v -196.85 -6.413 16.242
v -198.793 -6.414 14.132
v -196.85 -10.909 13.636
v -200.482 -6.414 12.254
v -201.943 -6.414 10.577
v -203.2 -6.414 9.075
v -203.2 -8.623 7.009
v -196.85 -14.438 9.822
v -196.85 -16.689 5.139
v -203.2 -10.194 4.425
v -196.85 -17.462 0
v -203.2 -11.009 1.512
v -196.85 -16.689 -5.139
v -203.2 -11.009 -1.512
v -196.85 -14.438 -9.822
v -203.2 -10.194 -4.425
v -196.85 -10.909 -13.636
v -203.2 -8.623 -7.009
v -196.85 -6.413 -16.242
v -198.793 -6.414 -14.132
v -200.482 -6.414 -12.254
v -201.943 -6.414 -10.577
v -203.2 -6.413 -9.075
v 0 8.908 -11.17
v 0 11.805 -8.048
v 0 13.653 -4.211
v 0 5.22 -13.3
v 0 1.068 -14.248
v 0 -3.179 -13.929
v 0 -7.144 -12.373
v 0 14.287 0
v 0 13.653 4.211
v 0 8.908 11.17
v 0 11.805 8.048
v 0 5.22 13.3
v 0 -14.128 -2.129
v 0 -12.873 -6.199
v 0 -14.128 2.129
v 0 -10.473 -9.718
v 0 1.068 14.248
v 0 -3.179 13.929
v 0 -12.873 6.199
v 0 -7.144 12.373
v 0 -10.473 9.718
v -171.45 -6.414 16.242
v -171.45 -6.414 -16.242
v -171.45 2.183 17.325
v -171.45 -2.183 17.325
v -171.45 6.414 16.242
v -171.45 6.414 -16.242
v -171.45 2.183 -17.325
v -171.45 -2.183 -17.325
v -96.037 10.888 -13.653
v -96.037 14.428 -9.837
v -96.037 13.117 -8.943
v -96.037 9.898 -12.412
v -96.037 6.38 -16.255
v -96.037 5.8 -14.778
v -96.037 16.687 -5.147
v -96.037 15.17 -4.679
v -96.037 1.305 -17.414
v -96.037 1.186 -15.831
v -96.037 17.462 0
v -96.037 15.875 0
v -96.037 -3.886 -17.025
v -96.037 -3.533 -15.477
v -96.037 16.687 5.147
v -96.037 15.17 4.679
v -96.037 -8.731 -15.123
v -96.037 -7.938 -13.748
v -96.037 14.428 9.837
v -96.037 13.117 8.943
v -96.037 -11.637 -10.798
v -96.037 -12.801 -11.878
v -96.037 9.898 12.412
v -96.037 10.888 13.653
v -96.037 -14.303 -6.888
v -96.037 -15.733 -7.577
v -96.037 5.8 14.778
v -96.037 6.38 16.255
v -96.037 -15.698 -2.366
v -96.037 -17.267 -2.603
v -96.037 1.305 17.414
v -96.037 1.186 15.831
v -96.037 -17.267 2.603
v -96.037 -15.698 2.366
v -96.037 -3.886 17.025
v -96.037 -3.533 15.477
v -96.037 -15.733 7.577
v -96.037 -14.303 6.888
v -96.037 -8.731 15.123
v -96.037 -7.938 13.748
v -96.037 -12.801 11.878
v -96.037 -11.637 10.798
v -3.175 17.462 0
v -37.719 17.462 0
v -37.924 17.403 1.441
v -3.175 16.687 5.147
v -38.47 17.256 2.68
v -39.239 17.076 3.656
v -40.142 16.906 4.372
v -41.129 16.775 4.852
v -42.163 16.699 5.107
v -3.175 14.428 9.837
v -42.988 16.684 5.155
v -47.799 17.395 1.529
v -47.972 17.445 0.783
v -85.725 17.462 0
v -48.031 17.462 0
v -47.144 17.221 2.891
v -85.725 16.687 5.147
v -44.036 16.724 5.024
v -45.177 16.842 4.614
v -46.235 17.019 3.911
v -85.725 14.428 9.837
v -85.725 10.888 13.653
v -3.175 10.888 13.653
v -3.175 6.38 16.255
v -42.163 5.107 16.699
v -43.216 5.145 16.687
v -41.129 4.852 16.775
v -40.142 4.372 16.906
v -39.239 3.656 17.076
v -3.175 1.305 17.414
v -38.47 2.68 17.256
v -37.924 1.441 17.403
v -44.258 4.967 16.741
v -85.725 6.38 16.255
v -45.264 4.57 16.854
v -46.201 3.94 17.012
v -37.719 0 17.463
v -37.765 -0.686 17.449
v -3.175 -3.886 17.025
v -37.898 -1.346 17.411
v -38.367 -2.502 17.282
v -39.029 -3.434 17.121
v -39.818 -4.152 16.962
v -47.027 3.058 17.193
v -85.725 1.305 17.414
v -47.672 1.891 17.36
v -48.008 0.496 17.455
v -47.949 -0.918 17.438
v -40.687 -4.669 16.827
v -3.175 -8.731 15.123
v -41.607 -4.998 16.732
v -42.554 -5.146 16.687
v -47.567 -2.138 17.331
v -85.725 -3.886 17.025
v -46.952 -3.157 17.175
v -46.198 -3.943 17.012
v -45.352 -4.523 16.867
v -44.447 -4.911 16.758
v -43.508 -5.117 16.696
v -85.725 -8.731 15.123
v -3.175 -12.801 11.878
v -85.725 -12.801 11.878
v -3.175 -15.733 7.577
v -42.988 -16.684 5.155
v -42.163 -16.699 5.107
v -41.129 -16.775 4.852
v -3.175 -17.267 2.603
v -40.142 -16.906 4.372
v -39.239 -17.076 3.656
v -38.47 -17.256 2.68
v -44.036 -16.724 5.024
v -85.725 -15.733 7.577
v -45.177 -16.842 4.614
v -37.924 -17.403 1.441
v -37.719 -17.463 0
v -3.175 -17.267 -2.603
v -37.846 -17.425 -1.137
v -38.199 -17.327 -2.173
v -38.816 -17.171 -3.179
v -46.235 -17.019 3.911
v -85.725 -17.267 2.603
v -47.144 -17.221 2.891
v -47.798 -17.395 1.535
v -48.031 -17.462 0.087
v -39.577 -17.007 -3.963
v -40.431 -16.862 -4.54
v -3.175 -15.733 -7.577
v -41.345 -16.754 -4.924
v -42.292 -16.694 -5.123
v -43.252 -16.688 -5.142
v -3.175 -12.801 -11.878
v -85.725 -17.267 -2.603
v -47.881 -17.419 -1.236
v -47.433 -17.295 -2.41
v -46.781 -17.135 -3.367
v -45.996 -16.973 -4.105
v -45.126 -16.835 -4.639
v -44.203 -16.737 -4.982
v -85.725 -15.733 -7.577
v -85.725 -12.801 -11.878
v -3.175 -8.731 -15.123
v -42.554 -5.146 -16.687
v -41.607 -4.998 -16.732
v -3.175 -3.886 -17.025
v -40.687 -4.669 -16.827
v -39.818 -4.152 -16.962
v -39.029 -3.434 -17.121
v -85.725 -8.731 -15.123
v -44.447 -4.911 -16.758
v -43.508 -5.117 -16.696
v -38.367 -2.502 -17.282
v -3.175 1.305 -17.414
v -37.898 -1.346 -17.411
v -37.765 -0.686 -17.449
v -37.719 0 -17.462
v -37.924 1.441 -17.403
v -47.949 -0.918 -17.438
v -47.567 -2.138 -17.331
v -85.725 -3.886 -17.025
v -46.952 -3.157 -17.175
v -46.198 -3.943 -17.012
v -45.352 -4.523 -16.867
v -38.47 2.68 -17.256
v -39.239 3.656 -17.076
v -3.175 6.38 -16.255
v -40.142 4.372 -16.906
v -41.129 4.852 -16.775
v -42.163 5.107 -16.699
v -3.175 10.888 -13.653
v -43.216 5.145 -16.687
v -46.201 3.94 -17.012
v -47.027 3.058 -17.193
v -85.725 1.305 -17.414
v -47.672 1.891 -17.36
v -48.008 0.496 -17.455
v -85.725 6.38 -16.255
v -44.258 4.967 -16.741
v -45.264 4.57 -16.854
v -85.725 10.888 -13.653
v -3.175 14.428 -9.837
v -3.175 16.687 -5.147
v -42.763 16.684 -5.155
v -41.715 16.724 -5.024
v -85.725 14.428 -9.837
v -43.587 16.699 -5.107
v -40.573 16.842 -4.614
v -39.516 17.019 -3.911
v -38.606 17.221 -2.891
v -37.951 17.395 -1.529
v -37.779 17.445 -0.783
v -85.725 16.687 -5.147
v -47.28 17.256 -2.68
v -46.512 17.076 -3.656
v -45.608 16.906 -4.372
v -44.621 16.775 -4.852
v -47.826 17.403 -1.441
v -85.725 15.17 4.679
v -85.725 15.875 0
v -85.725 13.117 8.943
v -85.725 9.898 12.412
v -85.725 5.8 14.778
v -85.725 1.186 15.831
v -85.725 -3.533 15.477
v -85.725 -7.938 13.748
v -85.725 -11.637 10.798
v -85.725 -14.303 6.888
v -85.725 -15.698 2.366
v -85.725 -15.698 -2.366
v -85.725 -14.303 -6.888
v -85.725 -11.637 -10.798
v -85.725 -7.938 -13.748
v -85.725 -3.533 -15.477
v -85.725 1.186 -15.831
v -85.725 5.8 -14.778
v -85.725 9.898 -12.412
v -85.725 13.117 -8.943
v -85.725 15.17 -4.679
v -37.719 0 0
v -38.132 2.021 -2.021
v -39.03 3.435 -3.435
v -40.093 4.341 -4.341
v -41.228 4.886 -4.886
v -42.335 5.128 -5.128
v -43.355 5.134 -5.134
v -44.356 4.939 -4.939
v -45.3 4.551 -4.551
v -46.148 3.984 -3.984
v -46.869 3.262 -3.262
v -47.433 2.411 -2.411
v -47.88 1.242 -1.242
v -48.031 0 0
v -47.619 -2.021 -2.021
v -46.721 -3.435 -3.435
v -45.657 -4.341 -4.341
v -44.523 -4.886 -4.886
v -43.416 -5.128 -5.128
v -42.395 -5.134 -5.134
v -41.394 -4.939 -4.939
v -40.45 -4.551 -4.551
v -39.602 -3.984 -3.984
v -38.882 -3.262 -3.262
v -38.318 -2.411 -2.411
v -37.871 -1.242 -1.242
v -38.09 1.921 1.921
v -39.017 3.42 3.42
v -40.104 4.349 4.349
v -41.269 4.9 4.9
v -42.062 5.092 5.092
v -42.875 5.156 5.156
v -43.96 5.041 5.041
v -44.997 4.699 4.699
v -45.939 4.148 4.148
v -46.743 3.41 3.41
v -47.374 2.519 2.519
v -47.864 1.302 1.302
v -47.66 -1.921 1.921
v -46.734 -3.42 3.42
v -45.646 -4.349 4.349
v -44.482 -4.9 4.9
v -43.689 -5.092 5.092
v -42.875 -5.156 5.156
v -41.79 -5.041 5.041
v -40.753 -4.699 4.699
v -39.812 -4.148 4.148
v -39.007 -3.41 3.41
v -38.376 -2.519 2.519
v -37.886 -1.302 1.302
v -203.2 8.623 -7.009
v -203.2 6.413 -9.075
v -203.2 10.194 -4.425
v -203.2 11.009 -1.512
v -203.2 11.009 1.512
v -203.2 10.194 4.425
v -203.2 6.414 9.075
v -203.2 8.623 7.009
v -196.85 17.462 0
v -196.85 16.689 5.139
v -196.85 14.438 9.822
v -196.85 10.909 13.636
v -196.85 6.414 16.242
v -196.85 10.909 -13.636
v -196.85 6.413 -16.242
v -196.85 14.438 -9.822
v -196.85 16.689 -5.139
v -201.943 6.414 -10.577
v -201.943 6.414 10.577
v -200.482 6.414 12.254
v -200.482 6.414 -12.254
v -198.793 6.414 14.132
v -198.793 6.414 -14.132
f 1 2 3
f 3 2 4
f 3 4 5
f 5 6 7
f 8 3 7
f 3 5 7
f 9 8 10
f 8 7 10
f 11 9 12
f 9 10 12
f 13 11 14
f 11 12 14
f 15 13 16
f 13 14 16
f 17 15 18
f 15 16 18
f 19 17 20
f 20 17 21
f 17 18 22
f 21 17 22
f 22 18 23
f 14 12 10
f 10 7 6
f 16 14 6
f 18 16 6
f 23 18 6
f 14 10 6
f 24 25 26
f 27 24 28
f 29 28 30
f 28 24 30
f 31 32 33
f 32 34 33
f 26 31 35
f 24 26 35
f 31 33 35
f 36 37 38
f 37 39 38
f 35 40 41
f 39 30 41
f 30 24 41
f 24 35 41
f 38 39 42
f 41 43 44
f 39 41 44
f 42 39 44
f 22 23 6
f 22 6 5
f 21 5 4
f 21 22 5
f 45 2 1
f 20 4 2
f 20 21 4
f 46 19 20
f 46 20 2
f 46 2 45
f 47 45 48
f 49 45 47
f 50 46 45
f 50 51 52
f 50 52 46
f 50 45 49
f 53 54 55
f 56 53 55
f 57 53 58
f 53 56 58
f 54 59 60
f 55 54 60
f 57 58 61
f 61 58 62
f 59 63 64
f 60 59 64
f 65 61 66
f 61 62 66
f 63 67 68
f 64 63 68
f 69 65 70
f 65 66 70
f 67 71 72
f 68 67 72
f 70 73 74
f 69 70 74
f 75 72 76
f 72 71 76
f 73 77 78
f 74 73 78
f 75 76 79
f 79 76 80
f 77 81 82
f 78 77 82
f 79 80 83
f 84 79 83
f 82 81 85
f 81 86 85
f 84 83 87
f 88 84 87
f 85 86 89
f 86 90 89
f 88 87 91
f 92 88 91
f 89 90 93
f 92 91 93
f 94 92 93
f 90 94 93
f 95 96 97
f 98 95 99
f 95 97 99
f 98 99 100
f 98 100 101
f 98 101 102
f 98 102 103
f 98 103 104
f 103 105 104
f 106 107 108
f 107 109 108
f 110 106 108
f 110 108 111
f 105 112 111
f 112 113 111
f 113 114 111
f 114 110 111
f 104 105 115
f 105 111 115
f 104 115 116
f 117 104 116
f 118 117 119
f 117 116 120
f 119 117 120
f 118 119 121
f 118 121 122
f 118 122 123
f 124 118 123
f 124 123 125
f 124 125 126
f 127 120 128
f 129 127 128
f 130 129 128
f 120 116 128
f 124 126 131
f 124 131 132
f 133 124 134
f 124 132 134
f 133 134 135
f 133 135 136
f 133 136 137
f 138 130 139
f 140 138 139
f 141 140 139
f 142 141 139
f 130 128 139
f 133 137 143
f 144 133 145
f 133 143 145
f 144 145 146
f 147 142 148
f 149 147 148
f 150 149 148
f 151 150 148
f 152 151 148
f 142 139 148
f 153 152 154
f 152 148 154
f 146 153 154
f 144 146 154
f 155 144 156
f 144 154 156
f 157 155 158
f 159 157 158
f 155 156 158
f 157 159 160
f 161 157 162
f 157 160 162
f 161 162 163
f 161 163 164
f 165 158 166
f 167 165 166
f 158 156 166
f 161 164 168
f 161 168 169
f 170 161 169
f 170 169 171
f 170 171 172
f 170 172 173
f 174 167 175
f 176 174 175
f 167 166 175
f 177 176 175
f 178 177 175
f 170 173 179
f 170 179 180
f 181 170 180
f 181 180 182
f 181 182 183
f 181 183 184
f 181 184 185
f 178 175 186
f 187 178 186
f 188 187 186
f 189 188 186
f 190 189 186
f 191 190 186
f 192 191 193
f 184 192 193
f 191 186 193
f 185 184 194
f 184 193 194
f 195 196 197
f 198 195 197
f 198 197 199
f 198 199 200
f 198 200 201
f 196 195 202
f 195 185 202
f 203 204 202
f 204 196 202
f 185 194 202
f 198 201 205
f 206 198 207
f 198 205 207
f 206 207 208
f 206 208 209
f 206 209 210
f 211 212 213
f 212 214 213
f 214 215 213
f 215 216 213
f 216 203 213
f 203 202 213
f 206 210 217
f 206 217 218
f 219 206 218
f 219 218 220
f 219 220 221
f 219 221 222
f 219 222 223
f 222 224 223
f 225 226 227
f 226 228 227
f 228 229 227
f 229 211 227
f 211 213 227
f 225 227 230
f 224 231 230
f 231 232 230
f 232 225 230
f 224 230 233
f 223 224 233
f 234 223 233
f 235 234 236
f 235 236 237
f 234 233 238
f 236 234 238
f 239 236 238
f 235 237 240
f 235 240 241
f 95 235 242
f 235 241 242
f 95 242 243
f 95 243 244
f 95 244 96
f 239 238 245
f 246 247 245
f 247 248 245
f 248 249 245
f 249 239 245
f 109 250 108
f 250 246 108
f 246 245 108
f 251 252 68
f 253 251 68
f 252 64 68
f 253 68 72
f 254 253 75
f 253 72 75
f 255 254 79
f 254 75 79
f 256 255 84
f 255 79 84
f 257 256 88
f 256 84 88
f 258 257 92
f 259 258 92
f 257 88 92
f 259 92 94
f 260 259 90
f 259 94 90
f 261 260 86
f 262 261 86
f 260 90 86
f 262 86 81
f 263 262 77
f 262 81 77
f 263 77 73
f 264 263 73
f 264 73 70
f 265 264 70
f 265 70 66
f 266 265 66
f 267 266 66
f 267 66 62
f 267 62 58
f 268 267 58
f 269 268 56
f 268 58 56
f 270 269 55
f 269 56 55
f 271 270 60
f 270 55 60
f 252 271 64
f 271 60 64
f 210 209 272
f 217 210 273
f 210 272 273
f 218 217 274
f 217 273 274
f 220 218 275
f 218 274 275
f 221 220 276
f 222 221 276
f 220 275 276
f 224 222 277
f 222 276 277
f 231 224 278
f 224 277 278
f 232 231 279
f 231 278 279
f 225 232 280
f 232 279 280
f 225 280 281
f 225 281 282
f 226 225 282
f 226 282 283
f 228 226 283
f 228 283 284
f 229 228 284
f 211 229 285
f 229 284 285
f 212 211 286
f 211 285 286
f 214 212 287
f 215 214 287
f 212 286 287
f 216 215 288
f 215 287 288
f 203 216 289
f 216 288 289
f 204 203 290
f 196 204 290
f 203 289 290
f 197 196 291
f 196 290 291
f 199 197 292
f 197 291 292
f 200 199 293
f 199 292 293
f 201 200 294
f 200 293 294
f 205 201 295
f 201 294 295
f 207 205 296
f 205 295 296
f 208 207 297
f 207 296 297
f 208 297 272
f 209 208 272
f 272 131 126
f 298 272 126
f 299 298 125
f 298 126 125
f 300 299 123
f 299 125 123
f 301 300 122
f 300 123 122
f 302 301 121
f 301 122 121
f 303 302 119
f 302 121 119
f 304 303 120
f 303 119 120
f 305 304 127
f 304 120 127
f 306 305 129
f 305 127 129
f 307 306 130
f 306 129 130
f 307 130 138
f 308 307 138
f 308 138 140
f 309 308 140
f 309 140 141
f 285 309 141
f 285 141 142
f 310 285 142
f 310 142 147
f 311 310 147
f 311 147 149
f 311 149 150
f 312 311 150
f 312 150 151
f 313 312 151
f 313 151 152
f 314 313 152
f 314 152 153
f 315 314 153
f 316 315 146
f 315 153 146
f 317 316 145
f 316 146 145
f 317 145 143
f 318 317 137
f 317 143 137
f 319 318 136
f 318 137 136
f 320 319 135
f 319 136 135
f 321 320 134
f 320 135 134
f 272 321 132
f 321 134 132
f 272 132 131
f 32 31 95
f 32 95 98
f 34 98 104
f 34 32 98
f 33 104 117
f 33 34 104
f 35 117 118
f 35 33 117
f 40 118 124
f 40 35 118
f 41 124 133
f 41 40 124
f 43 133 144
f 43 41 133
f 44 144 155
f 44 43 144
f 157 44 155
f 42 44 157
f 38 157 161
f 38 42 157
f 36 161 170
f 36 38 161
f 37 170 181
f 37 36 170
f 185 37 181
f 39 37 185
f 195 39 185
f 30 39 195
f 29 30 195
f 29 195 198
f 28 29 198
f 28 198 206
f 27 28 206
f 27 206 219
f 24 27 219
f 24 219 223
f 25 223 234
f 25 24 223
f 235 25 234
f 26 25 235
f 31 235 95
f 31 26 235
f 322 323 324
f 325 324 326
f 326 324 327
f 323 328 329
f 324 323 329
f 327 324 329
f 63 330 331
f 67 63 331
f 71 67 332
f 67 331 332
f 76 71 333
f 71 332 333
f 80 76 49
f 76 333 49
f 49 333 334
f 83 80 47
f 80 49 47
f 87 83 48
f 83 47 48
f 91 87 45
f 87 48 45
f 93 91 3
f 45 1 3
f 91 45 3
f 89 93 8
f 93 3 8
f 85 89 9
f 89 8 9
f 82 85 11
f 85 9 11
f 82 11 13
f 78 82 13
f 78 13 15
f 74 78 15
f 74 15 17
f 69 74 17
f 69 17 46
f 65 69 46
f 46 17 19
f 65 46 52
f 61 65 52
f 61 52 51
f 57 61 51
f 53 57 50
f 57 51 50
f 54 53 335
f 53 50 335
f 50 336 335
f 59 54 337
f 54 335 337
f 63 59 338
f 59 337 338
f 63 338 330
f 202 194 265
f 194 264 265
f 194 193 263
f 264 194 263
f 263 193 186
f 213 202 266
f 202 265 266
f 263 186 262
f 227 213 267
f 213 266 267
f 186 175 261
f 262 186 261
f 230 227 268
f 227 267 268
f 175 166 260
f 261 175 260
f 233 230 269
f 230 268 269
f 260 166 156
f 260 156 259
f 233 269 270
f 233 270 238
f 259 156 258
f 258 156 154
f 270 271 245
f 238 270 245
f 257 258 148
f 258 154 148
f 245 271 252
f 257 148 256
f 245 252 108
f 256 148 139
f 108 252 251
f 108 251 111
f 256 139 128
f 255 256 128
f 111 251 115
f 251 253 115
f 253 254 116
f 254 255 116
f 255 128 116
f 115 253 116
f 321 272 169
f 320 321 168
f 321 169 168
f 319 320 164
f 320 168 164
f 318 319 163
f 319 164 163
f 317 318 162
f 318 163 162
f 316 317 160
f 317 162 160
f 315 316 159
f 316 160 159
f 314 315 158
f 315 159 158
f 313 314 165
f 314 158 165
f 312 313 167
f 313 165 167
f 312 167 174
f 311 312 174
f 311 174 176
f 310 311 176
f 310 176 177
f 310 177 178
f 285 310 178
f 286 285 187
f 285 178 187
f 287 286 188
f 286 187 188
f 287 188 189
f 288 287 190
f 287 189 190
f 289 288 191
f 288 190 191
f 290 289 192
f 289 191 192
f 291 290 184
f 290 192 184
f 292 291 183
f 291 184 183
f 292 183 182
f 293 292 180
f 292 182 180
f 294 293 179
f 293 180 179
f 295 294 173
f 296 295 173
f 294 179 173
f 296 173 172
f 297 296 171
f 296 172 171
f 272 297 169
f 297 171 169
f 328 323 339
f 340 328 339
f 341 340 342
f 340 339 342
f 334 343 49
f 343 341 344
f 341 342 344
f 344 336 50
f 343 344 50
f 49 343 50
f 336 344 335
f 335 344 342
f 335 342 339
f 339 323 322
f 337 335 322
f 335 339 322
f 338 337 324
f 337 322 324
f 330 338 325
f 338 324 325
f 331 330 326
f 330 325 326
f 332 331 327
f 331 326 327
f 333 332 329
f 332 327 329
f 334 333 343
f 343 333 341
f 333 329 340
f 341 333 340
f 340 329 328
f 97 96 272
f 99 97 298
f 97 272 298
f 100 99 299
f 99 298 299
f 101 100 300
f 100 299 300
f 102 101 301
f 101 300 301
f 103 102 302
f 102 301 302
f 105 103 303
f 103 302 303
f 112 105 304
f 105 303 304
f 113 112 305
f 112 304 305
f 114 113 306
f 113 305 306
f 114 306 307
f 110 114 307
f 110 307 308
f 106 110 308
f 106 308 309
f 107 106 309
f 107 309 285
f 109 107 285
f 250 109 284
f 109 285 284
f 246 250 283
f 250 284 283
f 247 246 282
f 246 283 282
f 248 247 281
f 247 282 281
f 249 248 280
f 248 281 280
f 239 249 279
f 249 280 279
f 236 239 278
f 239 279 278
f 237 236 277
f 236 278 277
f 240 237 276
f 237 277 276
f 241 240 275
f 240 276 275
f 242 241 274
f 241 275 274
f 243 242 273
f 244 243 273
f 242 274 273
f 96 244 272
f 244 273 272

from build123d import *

# Parameters (mm, degrees)
F2_SIZE  = 6.35
F3_SIZE  = 3.175
F4_W     = 33.02
F4_H     = 12.827
F4_R     = 5.1562
F5_DEPTH = 19.05
F6_R     = 5.1562
F7_DEPTH = 19.05


with BuildPart() as f1:
    # F0 (on Top) → F1 (revolve)
    with BuildSketch(Plane.XY):
        Polygon((-203.2, 0), (0, 0), (0, 17.4625), (-85.725, 17.4625), (-85.725, 15.875), (-96.0374, 15.875), (-96.0374, 17.4625), (-203.2, 17.4625), align=None)
    revolve(axis=Axis((-82.347021, 0, 0), (1, 0, 0)))

    # F2
    f2_edges = [f1.edges().sort_by_distance(p)[0] for p in [
        (-203.2, -17.4625, 0),
    ]]
    chamfer(f2_edges, length=F2_SIZE)

    # F3
    f3_edges = [f1.edges().sort_by_distance(p)[0] for p in [
        (0, -17.4625, 0),
    ]]
    chamfer(f3_edges, length=F3_SIZE)

    # F4 (on Top) → F5 (cut, symmetric)
    with BuildSketch(Plane.XY):
        with Locations((-187.96, 0)):
            Rectangle(F4_W, F4_H)
        with Locations((-42.8752, 0)):
            Circle(F4_R)
    extrude(amount=F5_DEPTH, both=True, mode=Mode.SUBTRACT)

    # F6 (on Front) → F7 (cut, symmetric)
    with BuildSketch(Plane.XZ):
        with Locations((-42.8752, 0)):
            Circle(F6_R)
    extrude(amount=F7_DEPTH, both=True, mode=Mode.SUBTRACT)


solid = f1.part
